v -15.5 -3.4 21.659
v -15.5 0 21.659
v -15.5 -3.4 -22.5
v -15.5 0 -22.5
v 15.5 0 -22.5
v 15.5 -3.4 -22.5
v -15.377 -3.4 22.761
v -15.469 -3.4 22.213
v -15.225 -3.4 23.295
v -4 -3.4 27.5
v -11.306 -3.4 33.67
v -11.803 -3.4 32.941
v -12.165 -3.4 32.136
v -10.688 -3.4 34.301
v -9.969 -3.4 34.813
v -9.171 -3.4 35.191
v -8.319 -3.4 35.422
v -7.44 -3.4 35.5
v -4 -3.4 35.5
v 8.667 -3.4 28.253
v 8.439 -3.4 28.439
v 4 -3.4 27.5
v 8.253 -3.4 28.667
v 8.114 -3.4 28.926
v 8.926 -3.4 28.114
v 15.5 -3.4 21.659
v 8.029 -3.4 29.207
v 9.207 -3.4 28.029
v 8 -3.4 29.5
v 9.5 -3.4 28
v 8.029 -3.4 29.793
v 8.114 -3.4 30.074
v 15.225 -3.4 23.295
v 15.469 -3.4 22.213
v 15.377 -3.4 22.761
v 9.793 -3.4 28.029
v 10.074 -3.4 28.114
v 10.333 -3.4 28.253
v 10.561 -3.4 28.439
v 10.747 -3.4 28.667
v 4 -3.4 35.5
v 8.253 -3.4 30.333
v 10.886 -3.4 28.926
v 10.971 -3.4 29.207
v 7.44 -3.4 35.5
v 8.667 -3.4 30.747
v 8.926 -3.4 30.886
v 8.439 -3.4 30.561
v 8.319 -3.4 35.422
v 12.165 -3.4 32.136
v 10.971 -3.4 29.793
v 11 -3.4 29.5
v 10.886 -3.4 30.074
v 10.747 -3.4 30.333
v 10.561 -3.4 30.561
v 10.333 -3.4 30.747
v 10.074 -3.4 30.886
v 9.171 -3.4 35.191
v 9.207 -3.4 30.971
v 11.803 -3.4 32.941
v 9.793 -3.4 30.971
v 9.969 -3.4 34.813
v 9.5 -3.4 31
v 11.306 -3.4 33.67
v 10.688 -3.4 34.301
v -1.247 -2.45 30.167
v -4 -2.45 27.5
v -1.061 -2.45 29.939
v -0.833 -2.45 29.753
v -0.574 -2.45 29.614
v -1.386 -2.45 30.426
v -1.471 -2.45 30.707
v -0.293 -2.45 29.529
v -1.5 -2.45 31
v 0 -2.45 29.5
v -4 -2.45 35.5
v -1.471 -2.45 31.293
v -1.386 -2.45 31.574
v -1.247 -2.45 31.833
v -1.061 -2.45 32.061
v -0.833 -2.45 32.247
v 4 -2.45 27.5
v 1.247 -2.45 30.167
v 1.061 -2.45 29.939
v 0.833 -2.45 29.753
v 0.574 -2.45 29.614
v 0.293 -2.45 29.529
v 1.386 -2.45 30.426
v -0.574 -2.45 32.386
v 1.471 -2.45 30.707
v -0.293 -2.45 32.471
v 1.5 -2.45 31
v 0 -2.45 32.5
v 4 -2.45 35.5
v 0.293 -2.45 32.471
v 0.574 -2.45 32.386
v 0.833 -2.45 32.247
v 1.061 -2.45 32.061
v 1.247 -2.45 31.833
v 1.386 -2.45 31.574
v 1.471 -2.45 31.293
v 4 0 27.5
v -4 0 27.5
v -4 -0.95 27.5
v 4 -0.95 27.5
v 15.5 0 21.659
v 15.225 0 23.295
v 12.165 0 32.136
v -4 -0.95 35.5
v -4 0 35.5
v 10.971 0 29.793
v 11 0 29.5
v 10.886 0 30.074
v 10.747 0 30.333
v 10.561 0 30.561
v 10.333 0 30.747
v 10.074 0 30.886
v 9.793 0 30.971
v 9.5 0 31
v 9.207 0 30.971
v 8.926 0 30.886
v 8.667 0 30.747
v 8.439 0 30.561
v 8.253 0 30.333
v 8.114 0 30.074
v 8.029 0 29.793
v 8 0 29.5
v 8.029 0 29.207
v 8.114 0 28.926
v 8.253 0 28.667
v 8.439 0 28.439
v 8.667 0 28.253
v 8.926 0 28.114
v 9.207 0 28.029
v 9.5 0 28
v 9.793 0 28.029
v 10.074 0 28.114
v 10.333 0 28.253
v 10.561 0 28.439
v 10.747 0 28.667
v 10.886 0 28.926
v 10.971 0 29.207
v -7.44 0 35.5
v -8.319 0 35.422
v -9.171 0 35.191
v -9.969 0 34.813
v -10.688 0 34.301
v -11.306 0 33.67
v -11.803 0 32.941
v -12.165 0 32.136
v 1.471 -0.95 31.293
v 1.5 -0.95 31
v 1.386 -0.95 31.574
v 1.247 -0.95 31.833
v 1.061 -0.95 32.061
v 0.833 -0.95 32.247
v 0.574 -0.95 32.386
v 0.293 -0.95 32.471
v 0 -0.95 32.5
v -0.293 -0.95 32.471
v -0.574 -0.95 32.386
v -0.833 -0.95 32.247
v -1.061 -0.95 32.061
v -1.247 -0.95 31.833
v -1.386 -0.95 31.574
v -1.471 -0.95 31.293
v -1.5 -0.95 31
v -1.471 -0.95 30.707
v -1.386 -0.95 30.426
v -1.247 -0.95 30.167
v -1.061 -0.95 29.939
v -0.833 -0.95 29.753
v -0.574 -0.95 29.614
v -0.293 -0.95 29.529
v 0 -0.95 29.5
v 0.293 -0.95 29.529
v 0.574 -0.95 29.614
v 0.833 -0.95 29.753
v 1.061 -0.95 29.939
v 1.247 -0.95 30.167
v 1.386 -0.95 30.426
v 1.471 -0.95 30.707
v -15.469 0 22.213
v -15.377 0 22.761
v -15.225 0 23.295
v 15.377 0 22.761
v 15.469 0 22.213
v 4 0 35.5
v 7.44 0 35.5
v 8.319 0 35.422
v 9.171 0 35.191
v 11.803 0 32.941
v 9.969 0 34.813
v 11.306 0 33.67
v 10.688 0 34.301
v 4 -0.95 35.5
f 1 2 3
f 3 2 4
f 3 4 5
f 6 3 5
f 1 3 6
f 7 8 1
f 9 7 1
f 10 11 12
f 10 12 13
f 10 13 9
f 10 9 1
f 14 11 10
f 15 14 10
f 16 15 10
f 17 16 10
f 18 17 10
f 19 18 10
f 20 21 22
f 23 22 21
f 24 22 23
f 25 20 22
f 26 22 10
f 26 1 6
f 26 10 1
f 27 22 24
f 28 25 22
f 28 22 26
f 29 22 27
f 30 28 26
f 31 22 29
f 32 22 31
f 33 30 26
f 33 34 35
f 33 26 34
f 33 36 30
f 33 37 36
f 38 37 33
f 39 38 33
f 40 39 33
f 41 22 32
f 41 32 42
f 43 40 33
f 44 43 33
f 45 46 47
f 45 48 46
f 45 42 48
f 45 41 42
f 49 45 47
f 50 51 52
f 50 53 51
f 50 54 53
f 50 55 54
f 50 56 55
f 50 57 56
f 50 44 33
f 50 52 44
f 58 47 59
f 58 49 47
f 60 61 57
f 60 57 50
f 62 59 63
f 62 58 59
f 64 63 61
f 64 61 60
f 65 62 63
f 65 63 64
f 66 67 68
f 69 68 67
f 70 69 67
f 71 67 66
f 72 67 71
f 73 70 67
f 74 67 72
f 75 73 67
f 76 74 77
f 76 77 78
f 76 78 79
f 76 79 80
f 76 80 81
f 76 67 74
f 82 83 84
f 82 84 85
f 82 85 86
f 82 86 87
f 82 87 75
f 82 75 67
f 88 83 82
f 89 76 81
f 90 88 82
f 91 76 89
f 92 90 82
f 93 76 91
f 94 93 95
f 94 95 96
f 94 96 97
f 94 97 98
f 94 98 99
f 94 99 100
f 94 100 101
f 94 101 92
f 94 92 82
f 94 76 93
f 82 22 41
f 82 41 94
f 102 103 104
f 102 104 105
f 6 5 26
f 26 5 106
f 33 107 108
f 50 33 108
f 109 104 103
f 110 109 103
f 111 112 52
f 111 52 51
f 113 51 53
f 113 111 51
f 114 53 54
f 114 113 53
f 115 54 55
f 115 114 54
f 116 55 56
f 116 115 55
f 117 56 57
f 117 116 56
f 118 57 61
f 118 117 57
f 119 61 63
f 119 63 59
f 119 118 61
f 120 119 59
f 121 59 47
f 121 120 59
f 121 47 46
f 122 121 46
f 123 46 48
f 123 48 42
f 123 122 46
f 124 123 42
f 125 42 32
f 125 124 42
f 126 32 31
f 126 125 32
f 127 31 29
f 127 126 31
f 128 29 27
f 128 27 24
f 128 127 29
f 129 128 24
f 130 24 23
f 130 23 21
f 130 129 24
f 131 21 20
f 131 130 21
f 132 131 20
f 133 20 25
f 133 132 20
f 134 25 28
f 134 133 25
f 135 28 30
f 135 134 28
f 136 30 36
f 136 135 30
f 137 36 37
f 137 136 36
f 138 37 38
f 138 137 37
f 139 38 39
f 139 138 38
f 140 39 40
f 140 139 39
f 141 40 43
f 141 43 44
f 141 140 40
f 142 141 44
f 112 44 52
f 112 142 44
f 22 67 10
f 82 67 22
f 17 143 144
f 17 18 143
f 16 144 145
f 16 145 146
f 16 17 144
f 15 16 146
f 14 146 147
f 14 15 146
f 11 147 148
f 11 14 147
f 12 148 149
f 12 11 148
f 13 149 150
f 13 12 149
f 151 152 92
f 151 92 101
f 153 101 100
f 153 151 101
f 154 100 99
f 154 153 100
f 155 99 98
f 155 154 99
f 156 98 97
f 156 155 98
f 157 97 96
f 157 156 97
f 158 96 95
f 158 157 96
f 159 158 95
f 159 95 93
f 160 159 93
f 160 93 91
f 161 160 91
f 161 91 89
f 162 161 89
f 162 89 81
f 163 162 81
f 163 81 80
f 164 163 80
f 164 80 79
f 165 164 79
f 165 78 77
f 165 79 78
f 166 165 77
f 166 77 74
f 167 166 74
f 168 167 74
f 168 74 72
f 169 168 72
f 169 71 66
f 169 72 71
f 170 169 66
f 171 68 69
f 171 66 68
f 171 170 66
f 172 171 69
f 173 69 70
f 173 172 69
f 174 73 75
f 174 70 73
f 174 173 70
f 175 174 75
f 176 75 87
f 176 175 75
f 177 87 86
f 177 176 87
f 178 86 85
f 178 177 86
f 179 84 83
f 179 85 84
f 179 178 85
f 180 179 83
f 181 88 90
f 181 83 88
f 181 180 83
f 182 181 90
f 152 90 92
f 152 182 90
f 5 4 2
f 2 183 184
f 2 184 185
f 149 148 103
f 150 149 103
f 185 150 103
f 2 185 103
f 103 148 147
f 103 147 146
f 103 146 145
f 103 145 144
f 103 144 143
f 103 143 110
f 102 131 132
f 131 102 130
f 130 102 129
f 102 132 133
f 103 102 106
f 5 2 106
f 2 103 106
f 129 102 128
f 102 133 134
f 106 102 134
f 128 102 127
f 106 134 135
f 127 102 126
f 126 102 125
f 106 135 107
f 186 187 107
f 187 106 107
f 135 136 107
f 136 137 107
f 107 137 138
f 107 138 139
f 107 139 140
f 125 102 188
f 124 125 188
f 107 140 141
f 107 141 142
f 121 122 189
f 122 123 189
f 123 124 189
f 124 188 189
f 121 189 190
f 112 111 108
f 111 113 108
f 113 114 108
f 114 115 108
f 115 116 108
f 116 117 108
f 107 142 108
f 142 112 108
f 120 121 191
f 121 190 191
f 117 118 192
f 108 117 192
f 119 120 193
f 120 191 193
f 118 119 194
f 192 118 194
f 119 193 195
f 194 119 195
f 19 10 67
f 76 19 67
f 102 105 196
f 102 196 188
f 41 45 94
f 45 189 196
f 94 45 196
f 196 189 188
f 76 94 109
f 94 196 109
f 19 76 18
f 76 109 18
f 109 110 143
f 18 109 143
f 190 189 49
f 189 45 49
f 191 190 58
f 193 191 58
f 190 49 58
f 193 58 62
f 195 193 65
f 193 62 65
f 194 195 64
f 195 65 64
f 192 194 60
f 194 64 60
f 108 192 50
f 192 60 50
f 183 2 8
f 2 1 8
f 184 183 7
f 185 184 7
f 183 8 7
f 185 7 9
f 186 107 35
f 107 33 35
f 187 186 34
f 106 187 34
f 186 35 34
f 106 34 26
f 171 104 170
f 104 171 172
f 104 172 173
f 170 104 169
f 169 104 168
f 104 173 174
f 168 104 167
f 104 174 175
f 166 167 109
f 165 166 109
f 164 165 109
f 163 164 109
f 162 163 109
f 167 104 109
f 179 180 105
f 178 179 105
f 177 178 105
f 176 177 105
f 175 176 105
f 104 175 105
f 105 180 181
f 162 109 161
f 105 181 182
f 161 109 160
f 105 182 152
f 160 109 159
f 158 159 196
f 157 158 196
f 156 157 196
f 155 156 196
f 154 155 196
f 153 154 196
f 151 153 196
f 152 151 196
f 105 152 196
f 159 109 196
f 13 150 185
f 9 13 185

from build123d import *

# Parameters (mm, degrees)
F1_R     = 1.5
F1_W     = 22
F1_H     = 13
F2_DEPTH = 3.4
F3_W     = 8
F3_H     = 0.95
F4_DEPTH = 8
F5_DEPTH = 8
F6_R     = 5
F7_R     = 5
F8_R     = 5
F9_R     = 5


with BuildPart() as f2:
    # F1 (on Front) → F2 (new body)
    with BuildSketch(Plane.XZ):
        Polygon((15.5, -22.5), (15.5, 22.5), (11, 22.5), (11, 9.5), (-11, 9.5), (-11, 22.5), (-15.5, 22.5), (-15.5, -22.5), align=None)
        Polygon((11, 22.5), (15.5, 22.5), (11, 35.5), (11, 29.5), align=None)
        Polygon((-11, 22.5), (11, 22.5), (11, 29.5), (11, 35.5), (-11, 35.5), align=None)
        with Locations((0, 31)):
            Circle(F1_R, mode=Mode.SUBTRACT)
        with Locations((9.5, 29.5)):
            Circle(F1_R, mode=Mode.SUBTRACT)
        Polygon((-15.5, 22.5), (-11, 22.5), (-11, 35.5), align=None)
        with Locations((0, 16)):
            Rectangle(F1_W, F1_H)
    extrude(amount=F2_DEPTH)

    # F3 (on face) → F4 (cut)
    with BuildSketch(Plane.XY.offset(35.5)):
        with Locations((0, -0.475)):
            Rectangle(F3_W, F3_H)
    extrude(amount=-F4_DEPTH, mode=Mode.SUBTRACT)

    # F3 (on face) → F5 (cut)
    with BuildSketch(Plane.XY.offset(35.5)):
        with Locations((0, -2.925)):
            Rectangle(F3_W, F3_H)
    extrude(amount=-F5_DEPTH, mode=Mode.SUBTRACT)

    # F6
    f6_edges = [f2.edges().sort_by_distance(p)[0] for p in [
        (-11, -1.7, 35.5),
    ]]
    fillet(f6_edges, radius=F6_R)

    # F7
    f7_edges = [f2.edges().sort_by_distance(p)[0] for p in [
        (11, -1.7, 35.5),
    ]]
    fillet(f7_edges, radius=F7_R)

    # F8
    f8_edges = [f2.edges().sort_by_distance(p)[0] for p in [
        (15.5, -1.7, 22.5),
    ]]
    fillet(f8_edges, radius=F8_R)

    # F9
    f9_edges = [f2.edges().sort_by_distance(p)[0] for p in [
        (-15.5, -1.7, 22.5),
    ]]
    fillet(f9_edges, radius=F9_R)


solid = f2.part
